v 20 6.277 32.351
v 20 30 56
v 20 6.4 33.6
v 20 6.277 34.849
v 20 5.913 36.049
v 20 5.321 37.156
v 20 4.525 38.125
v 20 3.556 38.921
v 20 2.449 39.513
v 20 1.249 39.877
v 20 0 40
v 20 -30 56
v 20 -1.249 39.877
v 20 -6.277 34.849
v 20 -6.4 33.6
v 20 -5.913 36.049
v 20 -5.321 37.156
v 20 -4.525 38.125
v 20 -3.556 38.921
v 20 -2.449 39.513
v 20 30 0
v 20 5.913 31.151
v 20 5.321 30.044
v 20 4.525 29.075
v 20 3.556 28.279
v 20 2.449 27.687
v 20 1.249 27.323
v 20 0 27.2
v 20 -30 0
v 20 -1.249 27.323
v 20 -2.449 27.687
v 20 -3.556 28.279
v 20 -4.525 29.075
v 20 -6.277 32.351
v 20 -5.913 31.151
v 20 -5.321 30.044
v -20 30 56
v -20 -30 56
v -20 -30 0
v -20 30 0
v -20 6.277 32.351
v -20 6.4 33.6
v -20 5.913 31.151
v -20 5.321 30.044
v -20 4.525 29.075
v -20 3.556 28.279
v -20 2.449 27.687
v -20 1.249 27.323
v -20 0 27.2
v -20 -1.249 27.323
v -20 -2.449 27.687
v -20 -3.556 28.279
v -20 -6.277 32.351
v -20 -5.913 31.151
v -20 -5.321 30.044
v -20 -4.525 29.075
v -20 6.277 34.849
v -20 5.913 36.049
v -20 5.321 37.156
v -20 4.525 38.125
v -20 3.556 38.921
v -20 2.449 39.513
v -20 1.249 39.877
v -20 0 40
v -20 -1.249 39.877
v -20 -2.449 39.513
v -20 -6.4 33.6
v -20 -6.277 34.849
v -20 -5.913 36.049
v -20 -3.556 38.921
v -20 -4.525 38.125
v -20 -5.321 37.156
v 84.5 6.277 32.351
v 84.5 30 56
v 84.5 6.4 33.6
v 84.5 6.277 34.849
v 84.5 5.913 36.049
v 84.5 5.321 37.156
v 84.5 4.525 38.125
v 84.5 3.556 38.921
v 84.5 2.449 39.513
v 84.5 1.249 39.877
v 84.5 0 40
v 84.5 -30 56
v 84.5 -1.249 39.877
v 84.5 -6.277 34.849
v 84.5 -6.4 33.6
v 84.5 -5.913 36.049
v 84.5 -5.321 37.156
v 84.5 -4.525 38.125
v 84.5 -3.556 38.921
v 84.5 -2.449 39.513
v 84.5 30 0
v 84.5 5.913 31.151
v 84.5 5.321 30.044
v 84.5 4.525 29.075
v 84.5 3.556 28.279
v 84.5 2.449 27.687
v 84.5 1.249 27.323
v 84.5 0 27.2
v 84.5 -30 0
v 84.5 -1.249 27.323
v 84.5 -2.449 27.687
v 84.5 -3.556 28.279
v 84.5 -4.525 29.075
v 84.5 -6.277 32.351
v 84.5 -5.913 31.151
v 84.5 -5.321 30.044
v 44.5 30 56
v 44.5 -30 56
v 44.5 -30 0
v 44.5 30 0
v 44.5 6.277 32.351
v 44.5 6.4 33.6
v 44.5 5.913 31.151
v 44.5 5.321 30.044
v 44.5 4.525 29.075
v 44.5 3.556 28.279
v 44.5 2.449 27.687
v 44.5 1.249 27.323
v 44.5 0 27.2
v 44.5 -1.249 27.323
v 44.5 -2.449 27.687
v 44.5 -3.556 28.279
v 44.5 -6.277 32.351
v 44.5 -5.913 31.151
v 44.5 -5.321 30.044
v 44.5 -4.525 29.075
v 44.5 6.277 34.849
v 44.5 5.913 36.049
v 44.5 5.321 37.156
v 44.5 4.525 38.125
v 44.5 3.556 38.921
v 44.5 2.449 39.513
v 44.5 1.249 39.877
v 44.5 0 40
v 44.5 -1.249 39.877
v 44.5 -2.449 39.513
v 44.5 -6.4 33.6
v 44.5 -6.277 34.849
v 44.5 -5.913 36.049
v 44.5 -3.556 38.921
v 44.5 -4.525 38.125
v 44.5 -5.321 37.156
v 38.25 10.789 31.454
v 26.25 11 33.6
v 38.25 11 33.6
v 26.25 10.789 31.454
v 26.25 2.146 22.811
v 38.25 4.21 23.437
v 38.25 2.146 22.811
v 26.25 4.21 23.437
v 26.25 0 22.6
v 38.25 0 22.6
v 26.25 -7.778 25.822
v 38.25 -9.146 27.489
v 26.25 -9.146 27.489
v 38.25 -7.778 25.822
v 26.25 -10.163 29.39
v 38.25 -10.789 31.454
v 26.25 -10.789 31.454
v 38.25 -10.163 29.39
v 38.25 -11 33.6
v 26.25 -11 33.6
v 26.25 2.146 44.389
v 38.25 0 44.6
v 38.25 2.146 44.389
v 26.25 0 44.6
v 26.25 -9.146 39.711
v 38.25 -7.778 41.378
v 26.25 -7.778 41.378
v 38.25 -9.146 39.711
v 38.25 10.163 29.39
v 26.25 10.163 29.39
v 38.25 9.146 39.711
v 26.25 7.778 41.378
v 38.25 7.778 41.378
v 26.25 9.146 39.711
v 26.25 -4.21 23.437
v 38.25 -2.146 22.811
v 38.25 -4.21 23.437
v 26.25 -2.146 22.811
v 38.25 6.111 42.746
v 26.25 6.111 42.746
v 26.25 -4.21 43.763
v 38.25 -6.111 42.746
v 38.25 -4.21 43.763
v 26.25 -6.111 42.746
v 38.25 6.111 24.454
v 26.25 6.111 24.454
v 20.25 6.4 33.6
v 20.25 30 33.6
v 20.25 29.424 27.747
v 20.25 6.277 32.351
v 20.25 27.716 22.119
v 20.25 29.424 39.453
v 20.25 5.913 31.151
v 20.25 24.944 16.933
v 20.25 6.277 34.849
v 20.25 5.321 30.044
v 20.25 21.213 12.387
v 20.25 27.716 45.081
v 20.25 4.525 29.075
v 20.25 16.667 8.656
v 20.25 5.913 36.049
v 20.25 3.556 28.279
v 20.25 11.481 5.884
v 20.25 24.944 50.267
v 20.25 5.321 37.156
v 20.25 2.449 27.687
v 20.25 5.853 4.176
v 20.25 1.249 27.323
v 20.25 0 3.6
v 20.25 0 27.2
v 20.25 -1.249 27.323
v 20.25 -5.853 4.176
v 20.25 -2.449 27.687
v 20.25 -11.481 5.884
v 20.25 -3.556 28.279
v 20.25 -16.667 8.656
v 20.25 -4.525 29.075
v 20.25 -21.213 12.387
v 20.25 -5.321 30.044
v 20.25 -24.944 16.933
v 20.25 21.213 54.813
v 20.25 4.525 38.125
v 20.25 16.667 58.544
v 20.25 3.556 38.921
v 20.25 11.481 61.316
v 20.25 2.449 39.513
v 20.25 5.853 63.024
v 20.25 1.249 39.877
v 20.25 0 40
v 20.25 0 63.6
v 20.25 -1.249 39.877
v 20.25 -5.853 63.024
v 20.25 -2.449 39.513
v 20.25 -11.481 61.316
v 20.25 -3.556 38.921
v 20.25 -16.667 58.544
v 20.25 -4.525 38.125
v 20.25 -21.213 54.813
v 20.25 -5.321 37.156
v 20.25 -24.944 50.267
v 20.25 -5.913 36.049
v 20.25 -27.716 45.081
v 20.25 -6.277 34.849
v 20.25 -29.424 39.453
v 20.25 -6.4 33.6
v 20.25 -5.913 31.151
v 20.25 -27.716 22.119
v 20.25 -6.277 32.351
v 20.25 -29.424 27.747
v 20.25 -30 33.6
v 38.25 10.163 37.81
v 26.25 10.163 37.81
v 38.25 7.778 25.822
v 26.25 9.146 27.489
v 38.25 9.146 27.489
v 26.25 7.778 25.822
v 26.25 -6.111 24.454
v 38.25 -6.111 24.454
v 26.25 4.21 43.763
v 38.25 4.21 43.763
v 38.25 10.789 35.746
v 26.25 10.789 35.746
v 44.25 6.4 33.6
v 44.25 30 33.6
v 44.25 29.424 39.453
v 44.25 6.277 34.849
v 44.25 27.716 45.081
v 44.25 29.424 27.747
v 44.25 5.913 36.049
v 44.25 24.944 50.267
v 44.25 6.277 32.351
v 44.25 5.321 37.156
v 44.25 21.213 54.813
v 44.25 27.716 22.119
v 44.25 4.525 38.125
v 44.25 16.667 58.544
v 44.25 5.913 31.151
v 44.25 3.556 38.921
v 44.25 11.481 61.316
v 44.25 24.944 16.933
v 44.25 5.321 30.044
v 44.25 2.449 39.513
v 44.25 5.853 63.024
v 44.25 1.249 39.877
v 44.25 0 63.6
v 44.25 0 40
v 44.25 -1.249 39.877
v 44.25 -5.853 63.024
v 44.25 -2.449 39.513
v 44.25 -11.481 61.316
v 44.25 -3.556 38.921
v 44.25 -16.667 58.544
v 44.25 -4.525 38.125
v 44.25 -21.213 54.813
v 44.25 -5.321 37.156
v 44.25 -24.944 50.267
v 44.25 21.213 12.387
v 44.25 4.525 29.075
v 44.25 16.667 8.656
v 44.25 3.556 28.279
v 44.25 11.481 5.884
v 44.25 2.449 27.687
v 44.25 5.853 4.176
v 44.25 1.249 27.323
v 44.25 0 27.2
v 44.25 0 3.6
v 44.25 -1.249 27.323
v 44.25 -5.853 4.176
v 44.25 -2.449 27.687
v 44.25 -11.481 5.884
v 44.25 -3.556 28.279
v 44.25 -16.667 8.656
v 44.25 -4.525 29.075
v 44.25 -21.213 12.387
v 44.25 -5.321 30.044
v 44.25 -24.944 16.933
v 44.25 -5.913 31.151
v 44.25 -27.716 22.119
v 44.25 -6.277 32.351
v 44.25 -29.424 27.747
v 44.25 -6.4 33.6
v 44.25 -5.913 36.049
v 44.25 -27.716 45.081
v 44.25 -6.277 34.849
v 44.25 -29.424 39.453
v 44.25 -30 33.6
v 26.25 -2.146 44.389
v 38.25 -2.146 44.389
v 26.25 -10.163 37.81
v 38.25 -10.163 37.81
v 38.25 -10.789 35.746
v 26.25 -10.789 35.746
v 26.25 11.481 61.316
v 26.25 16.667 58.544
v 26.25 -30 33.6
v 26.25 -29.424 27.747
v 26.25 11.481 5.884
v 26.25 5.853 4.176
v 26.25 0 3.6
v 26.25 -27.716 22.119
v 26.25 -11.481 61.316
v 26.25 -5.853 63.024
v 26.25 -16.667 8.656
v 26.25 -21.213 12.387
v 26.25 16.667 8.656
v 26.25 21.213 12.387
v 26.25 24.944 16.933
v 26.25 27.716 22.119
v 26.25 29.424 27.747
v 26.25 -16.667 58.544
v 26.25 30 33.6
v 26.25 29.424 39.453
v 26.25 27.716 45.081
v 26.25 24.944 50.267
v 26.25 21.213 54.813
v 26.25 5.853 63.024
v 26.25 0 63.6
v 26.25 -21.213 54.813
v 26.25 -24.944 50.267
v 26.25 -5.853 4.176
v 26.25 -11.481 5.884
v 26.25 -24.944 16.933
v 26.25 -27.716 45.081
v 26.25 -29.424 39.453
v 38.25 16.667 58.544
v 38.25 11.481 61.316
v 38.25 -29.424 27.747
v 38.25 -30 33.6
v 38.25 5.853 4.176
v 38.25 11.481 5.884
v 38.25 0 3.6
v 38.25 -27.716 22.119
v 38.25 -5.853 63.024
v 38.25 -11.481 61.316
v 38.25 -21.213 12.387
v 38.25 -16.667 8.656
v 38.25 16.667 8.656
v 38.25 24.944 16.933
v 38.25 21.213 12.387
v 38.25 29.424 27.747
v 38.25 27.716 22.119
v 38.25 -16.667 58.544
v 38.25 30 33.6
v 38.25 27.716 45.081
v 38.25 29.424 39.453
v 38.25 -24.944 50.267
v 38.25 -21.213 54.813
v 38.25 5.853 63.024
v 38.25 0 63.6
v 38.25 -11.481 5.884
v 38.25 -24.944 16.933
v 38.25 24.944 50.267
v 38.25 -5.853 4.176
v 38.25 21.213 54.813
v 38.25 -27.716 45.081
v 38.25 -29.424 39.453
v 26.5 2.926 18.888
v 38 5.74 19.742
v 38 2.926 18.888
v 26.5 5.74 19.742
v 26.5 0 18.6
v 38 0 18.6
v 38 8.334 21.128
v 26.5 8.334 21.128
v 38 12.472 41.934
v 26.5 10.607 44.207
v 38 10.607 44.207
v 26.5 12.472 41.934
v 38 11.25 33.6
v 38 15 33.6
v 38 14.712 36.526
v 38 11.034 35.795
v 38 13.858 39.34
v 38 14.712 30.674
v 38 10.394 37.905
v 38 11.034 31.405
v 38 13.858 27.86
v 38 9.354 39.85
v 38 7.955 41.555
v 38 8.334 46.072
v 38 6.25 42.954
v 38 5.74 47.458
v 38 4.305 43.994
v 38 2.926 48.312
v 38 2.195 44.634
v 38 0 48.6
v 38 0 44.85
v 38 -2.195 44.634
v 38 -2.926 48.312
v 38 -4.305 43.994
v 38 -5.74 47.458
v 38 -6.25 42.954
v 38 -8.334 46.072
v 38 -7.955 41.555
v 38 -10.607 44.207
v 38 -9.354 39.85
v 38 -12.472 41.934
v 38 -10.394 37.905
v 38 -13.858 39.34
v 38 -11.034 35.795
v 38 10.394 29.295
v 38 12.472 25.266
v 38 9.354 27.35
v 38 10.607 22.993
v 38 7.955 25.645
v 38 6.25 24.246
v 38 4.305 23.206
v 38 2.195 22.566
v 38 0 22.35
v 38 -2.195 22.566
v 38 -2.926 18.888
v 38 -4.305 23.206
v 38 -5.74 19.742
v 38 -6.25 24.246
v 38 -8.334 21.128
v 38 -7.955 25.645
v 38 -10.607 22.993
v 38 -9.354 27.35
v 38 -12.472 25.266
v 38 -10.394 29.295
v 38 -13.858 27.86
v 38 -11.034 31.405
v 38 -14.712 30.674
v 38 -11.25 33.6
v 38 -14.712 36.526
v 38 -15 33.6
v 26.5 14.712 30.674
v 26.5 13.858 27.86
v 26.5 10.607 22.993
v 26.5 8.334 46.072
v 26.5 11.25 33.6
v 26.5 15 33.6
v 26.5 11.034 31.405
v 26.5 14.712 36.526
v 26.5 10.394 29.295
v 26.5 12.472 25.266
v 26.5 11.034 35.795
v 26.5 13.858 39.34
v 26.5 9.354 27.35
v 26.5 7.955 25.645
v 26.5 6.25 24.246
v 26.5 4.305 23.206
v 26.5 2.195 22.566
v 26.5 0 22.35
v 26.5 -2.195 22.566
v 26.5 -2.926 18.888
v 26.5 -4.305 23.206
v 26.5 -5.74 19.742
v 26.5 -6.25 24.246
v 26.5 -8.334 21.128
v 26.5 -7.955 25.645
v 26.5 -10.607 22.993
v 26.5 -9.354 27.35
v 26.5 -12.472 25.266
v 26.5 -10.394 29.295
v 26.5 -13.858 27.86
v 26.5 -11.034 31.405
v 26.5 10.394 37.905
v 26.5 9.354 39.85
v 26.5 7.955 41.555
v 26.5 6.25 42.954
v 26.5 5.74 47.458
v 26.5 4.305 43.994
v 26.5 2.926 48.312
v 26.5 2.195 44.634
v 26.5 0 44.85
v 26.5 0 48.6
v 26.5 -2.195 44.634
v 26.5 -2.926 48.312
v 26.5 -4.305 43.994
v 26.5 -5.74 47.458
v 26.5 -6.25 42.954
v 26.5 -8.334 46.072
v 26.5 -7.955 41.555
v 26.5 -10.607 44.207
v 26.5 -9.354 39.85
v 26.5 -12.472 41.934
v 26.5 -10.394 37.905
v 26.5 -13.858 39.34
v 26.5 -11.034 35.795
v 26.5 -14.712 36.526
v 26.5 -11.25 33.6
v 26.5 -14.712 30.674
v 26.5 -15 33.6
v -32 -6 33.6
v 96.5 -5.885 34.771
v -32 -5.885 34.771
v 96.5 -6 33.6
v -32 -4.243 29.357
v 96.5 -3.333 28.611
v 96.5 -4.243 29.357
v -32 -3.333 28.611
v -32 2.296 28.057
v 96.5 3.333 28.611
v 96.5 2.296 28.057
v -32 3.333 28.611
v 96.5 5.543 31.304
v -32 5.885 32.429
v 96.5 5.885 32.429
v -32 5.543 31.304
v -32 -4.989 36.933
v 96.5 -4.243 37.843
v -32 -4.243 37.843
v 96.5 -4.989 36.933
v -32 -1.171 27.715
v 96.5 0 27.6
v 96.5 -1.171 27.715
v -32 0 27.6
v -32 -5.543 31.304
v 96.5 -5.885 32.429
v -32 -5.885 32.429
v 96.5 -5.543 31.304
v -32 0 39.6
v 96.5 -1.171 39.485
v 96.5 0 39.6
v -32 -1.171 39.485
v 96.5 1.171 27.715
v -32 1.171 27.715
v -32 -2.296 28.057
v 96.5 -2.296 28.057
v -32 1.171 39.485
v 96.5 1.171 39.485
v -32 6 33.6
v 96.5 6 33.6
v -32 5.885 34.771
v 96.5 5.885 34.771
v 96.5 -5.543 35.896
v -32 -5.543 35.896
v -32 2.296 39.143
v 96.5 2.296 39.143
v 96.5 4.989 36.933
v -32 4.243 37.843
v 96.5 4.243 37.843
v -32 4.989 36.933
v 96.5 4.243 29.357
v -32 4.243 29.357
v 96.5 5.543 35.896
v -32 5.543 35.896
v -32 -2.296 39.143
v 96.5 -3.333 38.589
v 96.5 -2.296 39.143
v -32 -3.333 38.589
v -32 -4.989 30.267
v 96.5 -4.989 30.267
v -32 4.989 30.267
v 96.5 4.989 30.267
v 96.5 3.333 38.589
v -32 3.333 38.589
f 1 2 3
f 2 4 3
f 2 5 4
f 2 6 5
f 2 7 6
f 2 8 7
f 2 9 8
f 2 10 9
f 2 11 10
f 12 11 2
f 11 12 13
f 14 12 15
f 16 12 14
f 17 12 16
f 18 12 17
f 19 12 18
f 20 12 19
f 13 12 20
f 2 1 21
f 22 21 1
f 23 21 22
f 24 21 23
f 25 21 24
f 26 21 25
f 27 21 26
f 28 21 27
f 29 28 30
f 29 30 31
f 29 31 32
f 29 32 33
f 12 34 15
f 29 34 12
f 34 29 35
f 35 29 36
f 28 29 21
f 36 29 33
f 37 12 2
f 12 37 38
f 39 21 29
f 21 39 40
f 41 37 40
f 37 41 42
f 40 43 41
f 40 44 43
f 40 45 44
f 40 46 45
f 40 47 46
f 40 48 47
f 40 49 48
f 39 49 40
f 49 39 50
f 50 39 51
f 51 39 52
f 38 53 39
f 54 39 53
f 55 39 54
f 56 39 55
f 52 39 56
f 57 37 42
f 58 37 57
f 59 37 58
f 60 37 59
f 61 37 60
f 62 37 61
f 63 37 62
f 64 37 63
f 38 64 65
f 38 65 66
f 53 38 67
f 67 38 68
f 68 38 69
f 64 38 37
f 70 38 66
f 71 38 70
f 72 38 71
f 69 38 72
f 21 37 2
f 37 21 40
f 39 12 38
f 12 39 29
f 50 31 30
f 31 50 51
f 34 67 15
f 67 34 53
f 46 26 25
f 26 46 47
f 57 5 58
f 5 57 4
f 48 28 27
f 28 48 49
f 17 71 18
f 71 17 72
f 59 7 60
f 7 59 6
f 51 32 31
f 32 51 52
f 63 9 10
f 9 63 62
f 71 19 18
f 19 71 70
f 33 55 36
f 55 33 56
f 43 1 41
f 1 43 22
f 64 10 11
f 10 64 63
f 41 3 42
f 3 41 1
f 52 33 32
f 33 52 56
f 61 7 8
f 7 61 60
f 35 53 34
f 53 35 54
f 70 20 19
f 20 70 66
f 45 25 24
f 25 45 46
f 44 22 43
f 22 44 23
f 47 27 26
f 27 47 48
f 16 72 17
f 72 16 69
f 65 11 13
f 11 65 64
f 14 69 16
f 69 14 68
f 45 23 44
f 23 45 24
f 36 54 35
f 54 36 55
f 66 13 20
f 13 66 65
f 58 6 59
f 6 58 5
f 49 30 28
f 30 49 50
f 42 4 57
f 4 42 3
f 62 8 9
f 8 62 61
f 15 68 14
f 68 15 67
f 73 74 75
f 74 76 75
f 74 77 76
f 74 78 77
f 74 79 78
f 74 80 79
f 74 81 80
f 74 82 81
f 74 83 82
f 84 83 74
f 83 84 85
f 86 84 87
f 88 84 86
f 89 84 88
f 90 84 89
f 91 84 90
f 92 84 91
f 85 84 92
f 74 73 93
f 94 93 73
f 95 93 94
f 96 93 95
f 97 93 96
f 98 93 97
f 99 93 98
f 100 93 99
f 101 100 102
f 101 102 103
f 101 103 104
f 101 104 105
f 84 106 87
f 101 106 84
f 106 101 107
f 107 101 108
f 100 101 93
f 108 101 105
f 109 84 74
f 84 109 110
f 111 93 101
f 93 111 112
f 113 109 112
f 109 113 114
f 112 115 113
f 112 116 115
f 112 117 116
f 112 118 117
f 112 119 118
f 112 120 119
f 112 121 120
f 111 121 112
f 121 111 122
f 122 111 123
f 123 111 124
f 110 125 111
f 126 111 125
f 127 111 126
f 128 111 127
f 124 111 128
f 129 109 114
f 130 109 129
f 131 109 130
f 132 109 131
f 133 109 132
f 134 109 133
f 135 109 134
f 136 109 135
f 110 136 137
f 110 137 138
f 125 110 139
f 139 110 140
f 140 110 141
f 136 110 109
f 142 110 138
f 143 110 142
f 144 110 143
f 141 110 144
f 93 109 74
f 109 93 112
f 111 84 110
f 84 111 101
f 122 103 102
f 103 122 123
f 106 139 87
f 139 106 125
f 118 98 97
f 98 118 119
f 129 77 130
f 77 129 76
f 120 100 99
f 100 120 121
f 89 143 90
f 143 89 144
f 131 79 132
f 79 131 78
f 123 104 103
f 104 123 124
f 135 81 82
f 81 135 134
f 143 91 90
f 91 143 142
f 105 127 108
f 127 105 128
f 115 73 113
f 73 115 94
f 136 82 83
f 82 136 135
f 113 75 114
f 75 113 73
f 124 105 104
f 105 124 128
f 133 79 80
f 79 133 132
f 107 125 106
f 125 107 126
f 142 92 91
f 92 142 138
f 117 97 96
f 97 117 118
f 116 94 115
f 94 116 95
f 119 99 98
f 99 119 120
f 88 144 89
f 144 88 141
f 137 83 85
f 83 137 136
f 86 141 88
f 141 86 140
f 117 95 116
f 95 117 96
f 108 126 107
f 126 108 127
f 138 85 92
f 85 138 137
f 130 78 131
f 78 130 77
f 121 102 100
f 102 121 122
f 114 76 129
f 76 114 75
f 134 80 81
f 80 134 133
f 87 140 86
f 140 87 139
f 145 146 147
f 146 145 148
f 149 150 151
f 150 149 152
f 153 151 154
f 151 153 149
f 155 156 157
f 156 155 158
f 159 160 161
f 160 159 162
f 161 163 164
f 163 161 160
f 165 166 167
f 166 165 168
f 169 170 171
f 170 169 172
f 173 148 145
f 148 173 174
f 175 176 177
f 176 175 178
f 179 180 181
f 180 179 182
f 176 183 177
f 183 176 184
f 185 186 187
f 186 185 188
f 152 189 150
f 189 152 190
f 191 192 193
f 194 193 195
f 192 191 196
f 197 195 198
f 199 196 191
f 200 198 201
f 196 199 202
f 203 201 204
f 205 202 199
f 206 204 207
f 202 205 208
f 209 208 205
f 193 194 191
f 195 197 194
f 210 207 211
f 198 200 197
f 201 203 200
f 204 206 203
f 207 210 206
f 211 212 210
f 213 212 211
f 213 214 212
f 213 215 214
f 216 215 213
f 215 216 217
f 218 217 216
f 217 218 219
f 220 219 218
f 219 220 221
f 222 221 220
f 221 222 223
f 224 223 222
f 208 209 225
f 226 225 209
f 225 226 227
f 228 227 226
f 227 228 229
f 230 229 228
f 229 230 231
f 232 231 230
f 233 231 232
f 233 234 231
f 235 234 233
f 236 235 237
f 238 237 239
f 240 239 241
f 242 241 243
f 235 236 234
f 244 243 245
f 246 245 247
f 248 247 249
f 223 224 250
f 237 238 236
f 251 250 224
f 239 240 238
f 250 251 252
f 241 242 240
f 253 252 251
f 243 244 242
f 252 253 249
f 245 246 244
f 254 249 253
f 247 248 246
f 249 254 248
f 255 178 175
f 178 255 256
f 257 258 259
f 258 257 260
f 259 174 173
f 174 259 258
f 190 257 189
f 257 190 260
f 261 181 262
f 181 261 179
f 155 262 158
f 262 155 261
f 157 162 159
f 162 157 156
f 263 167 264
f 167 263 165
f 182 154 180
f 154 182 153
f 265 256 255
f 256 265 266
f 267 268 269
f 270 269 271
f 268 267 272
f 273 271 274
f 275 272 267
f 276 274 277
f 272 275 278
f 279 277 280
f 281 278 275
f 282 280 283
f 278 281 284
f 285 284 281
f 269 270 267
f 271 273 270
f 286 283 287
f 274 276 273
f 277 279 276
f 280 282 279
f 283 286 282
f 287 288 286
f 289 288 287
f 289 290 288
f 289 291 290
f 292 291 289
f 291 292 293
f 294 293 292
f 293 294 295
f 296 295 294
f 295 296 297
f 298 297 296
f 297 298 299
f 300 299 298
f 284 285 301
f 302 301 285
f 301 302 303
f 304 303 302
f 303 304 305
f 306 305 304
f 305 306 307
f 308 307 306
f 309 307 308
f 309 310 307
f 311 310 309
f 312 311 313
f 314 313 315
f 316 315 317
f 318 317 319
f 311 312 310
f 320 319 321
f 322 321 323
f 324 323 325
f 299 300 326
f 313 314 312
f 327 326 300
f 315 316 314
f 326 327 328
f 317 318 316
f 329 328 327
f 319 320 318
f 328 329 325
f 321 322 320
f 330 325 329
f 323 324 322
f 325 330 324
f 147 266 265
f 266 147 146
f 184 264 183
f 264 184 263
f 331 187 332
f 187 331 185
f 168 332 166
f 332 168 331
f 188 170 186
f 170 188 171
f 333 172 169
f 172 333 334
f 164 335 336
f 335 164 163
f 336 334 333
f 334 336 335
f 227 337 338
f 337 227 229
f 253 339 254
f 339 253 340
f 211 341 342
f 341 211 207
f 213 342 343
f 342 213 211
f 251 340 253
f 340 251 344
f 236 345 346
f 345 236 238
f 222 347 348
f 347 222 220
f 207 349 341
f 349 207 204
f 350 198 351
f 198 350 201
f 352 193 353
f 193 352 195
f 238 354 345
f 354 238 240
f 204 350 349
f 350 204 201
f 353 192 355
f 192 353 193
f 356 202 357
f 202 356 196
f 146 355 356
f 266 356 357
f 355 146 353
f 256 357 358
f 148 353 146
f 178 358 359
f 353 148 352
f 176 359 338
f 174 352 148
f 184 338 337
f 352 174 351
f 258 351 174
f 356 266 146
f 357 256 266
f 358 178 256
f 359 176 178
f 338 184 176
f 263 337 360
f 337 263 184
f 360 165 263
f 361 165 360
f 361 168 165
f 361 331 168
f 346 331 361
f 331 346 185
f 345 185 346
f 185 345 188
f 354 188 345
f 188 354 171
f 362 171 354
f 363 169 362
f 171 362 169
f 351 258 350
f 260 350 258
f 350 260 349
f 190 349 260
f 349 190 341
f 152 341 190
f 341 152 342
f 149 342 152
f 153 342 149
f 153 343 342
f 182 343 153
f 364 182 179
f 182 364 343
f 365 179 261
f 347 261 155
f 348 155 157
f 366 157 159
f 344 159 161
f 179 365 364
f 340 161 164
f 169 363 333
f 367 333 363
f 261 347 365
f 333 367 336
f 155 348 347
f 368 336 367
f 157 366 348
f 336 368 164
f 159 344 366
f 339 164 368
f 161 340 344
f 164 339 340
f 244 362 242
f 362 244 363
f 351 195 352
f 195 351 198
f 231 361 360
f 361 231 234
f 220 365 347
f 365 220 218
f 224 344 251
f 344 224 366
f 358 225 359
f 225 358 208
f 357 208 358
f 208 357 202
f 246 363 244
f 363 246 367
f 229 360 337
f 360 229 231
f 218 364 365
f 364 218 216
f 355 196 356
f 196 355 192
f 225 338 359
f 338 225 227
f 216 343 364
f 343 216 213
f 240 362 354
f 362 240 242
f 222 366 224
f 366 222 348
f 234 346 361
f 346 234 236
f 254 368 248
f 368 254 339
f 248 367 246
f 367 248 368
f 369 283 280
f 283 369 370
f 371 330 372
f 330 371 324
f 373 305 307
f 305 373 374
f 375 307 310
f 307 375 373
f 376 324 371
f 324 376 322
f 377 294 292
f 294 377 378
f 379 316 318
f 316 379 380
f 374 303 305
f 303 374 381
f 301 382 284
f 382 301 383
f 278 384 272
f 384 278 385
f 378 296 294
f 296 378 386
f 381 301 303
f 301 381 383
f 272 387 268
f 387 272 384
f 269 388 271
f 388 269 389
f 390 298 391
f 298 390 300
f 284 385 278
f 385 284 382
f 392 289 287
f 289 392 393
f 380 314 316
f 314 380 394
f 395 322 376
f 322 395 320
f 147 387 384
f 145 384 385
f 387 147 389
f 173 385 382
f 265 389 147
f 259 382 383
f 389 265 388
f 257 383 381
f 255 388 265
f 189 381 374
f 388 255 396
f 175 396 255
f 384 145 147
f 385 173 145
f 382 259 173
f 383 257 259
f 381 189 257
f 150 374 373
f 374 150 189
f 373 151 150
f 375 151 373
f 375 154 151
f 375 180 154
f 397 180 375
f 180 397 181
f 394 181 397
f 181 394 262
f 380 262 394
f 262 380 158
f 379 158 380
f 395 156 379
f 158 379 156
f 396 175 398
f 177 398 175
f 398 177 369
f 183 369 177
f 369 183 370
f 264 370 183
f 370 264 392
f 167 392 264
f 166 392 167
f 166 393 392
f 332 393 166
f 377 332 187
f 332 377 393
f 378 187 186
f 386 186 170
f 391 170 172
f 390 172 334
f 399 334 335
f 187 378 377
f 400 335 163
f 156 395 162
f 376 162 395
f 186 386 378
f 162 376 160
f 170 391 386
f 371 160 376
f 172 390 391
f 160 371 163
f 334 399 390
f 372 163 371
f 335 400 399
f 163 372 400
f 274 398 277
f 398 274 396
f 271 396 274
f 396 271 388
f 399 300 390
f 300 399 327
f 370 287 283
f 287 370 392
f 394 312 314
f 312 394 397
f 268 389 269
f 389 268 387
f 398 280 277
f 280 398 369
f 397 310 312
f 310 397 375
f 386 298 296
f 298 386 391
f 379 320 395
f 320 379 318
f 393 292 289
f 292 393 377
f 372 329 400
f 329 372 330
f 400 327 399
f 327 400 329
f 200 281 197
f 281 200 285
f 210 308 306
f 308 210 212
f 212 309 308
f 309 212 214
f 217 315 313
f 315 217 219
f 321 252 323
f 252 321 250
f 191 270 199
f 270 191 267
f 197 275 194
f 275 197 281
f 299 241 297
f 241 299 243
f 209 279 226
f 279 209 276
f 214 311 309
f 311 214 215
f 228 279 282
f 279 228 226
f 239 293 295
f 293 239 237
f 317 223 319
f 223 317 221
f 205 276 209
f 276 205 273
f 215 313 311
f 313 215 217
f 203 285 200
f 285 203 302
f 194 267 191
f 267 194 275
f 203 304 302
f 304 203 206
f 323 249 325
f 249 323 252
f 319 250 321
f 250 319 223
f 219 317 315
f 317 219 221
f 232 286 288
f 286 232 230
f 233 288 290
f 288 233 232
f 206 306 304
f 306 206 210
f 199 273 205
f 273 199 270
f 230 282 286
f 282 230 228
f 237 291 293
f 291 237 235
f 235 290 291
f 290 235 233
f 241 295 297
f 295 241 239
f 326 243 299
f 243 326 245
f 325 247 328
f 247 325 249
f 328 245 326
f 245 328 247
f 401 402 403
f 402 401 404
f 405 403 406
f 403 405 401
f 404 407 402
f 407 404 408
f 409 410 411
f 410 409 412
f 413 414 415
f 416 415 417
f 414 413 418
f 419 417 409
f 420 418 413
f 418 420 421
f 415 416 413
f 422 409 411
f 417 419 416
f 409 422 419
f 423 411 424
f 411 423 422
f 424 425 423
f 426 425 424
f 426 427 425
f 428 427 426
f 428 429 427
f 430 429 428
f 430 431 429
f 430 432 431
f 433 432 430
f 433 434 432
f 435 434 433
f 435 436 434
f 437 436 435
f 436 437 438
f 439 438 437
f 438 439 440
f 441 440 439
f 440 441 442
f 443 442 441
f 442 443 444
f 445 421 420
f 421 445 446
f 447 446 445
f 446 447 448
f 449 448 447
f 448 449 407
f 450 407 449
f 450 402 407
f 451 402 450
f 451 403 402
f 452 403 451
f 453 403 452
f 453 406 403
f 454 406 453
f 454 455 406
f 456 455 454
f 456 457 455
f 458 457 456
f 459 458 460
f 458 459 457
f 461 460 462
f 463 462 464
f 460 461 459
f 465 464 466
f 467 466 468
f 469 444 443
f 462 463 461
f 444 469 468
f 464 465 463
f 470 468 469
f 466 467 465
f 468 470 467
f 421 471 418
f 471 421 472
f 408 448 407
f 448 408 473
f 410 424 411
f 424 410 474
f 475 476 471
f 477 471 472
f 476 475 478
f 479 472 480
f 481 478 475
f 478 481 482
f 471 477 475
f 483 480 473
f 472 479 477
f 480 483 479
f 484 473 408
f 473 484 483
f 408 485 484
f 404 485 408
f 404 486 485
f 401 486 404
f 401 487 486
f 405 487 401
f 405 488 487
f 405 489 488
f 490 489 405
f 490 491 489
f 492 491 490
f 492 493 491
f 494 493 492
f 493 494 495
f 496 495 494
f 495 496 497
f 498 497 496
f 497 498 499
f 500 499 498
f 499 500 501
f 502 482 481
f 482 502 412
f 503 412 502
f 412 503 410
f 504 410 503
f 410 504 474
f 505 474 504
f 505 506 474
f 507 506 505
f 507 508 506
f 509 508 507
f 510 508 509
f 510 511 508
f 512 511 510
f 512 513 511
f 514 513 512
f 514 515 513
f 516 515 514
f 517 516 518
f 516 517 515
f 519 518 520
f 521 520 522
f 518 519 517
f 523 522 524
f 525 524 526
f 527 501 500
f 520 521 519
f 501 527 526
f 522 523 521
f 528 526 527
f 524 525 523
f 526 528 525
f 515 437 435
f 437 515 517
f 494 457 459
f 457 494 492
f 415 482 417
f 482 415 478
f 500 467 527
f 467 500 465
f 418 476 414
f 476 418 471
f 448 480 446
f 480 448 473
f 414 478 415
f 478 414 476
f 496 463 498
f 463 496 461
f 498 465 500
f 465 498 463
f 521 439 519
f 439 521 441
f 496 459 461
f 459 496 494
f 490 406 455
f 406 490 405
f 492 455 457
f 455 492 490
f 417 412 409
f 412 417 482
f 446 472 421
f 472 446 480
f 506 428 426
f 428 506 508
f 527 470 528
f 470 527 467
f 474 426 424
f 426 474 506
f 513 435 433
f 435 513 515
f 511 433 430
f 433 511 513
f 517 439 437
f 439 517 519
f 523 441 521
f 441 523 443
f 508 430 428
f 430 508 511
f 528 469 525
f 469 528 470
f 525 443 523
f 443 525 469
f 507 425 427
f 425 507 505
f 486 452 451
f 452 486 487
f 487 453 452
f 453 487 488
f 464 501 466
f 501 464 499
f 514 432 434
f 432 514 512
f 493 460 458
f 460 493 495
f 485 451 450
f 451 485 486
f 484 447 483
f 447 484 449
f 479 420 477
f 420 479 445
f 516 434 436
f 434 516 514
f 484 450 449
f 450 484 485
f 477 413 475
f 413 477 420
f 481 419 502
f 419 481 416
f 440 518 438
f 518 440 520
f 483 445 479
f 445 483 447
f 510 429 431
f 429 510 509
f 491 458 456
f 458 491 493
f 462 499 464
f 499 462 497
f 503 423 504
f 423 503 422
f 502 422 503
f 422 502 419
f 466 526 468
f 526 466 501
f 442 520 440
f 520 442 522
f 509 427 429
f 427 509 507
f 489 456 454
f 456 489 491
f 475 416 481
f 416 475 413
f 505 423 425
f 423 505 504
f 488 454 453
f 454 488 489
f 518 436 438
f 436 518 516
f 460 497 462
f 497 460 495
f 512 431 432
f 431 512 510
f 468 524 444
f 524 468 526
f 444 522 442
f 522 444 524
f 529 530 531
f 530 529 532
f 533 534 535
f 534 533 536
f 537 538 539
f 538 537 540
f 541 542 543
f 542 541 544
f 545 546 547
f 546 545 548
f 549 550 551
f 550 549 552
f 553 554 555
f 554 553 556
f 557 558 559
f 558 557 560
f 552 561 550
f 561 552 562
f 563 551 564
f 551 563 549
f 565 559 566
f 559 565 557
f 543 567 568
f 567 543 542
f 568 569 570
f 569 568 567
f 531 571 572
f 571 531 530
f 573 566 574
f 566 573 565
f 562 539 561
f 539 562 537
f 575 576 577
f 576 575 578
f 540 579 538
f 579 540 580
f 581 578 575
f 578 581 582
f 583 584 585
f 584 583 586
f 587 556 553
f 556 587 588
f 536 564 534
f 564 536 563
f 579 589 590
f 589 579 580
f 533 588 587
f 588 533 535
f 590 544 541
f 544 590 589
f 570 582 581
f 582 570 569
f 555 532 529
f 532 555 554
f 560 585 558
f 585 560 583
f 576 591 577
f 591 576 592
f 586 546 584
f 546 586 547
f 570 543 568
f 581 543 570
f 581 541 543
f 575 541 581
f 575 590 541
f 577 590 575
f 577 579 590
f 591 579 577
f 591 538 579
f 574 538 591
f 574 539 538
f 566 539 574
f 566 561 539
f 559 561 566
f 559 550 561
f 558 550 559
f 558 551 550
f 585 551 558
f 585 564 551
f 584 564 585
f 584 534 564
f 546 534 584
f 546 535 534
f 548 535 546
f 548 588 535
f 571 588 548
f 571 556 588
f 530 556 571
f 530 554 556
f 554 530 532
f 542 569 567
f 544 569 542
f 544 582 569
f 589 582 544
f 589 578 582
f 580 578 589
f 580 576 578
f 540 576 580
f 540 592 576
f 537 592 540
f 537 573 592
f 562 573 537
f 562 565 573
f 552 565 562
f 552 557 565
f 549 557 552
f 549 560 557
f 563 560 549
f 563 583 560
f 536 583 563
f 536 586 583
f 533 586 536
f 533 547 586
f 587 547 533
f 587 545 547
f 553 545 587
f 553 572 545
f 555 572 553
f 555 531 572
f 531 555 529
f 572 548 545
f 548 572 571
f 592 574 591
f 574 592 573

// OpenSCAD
$fn = 32;

// ------------------------------------------------------------------------
// Pulley assembly: d60 pulley with a belt, shaft d12
// Every part is its own module, assembly() places them once.
// ------------------------------------------------------------------------

// --- part 1 ---
module support1() {
  difference() {
    translate([-20, -30, 0]) cube([40, 60, 56]);
    translate([0, 0, 33.6]) rotate([0, 90, 0]) cylinder(h = 42, d = 12.8, center = true);
  }
}

// --- part 2 ---
module support2() {
  difference() {
    translate([-20, -30, 0]) cube([40, 60, 56]);
    translate([0, 0, 33.6]) rotate([0, 90, 0]) cylinder(h = 42, d = 12.8, center = true);
  }
}

// --- part 3 ---
module shaft() {
  translate([0, 0, -64.25]) cylinder(h = 128.5, d = 12);
}

// --- part 4 ---
module pulley() {
  difference() {
    union() {
      cylinder(h = 24, d = 22);
      cylinder(h = 6, d = 60);
      translate([0, 0, 18]) cylinder(h = 6, d = 60);
    }
    translate([0, 0, -1]) cylinder(h = 26, d = 12.8);
  }
}

// --- part 5 ---
module belt() {
  difference() {
      translate([0, 0, 0]) cylinder(h = 11.5, d = 30);
      translate([0, 0, -1]) cylinder(h = 13.5, d = 22.5);
    }
}

// --- assembly ---
module assembly() {
  translate([0, 0, 0]) rotate([0, 0, 0]) support1();
  translate([64.5, 0, 0]) rotate([0, 0, 0]) support2();
  translate([32.25, 0, 33.6]) rotate([0, 90, 0]) shaft();
  translate([20.25, 0, 33.6]) rotate([0, 90, 0]) pulley();
  translate([26.5, 0, 33.6]) rotate([0, 90, 0]) belt();
}

assembly();
